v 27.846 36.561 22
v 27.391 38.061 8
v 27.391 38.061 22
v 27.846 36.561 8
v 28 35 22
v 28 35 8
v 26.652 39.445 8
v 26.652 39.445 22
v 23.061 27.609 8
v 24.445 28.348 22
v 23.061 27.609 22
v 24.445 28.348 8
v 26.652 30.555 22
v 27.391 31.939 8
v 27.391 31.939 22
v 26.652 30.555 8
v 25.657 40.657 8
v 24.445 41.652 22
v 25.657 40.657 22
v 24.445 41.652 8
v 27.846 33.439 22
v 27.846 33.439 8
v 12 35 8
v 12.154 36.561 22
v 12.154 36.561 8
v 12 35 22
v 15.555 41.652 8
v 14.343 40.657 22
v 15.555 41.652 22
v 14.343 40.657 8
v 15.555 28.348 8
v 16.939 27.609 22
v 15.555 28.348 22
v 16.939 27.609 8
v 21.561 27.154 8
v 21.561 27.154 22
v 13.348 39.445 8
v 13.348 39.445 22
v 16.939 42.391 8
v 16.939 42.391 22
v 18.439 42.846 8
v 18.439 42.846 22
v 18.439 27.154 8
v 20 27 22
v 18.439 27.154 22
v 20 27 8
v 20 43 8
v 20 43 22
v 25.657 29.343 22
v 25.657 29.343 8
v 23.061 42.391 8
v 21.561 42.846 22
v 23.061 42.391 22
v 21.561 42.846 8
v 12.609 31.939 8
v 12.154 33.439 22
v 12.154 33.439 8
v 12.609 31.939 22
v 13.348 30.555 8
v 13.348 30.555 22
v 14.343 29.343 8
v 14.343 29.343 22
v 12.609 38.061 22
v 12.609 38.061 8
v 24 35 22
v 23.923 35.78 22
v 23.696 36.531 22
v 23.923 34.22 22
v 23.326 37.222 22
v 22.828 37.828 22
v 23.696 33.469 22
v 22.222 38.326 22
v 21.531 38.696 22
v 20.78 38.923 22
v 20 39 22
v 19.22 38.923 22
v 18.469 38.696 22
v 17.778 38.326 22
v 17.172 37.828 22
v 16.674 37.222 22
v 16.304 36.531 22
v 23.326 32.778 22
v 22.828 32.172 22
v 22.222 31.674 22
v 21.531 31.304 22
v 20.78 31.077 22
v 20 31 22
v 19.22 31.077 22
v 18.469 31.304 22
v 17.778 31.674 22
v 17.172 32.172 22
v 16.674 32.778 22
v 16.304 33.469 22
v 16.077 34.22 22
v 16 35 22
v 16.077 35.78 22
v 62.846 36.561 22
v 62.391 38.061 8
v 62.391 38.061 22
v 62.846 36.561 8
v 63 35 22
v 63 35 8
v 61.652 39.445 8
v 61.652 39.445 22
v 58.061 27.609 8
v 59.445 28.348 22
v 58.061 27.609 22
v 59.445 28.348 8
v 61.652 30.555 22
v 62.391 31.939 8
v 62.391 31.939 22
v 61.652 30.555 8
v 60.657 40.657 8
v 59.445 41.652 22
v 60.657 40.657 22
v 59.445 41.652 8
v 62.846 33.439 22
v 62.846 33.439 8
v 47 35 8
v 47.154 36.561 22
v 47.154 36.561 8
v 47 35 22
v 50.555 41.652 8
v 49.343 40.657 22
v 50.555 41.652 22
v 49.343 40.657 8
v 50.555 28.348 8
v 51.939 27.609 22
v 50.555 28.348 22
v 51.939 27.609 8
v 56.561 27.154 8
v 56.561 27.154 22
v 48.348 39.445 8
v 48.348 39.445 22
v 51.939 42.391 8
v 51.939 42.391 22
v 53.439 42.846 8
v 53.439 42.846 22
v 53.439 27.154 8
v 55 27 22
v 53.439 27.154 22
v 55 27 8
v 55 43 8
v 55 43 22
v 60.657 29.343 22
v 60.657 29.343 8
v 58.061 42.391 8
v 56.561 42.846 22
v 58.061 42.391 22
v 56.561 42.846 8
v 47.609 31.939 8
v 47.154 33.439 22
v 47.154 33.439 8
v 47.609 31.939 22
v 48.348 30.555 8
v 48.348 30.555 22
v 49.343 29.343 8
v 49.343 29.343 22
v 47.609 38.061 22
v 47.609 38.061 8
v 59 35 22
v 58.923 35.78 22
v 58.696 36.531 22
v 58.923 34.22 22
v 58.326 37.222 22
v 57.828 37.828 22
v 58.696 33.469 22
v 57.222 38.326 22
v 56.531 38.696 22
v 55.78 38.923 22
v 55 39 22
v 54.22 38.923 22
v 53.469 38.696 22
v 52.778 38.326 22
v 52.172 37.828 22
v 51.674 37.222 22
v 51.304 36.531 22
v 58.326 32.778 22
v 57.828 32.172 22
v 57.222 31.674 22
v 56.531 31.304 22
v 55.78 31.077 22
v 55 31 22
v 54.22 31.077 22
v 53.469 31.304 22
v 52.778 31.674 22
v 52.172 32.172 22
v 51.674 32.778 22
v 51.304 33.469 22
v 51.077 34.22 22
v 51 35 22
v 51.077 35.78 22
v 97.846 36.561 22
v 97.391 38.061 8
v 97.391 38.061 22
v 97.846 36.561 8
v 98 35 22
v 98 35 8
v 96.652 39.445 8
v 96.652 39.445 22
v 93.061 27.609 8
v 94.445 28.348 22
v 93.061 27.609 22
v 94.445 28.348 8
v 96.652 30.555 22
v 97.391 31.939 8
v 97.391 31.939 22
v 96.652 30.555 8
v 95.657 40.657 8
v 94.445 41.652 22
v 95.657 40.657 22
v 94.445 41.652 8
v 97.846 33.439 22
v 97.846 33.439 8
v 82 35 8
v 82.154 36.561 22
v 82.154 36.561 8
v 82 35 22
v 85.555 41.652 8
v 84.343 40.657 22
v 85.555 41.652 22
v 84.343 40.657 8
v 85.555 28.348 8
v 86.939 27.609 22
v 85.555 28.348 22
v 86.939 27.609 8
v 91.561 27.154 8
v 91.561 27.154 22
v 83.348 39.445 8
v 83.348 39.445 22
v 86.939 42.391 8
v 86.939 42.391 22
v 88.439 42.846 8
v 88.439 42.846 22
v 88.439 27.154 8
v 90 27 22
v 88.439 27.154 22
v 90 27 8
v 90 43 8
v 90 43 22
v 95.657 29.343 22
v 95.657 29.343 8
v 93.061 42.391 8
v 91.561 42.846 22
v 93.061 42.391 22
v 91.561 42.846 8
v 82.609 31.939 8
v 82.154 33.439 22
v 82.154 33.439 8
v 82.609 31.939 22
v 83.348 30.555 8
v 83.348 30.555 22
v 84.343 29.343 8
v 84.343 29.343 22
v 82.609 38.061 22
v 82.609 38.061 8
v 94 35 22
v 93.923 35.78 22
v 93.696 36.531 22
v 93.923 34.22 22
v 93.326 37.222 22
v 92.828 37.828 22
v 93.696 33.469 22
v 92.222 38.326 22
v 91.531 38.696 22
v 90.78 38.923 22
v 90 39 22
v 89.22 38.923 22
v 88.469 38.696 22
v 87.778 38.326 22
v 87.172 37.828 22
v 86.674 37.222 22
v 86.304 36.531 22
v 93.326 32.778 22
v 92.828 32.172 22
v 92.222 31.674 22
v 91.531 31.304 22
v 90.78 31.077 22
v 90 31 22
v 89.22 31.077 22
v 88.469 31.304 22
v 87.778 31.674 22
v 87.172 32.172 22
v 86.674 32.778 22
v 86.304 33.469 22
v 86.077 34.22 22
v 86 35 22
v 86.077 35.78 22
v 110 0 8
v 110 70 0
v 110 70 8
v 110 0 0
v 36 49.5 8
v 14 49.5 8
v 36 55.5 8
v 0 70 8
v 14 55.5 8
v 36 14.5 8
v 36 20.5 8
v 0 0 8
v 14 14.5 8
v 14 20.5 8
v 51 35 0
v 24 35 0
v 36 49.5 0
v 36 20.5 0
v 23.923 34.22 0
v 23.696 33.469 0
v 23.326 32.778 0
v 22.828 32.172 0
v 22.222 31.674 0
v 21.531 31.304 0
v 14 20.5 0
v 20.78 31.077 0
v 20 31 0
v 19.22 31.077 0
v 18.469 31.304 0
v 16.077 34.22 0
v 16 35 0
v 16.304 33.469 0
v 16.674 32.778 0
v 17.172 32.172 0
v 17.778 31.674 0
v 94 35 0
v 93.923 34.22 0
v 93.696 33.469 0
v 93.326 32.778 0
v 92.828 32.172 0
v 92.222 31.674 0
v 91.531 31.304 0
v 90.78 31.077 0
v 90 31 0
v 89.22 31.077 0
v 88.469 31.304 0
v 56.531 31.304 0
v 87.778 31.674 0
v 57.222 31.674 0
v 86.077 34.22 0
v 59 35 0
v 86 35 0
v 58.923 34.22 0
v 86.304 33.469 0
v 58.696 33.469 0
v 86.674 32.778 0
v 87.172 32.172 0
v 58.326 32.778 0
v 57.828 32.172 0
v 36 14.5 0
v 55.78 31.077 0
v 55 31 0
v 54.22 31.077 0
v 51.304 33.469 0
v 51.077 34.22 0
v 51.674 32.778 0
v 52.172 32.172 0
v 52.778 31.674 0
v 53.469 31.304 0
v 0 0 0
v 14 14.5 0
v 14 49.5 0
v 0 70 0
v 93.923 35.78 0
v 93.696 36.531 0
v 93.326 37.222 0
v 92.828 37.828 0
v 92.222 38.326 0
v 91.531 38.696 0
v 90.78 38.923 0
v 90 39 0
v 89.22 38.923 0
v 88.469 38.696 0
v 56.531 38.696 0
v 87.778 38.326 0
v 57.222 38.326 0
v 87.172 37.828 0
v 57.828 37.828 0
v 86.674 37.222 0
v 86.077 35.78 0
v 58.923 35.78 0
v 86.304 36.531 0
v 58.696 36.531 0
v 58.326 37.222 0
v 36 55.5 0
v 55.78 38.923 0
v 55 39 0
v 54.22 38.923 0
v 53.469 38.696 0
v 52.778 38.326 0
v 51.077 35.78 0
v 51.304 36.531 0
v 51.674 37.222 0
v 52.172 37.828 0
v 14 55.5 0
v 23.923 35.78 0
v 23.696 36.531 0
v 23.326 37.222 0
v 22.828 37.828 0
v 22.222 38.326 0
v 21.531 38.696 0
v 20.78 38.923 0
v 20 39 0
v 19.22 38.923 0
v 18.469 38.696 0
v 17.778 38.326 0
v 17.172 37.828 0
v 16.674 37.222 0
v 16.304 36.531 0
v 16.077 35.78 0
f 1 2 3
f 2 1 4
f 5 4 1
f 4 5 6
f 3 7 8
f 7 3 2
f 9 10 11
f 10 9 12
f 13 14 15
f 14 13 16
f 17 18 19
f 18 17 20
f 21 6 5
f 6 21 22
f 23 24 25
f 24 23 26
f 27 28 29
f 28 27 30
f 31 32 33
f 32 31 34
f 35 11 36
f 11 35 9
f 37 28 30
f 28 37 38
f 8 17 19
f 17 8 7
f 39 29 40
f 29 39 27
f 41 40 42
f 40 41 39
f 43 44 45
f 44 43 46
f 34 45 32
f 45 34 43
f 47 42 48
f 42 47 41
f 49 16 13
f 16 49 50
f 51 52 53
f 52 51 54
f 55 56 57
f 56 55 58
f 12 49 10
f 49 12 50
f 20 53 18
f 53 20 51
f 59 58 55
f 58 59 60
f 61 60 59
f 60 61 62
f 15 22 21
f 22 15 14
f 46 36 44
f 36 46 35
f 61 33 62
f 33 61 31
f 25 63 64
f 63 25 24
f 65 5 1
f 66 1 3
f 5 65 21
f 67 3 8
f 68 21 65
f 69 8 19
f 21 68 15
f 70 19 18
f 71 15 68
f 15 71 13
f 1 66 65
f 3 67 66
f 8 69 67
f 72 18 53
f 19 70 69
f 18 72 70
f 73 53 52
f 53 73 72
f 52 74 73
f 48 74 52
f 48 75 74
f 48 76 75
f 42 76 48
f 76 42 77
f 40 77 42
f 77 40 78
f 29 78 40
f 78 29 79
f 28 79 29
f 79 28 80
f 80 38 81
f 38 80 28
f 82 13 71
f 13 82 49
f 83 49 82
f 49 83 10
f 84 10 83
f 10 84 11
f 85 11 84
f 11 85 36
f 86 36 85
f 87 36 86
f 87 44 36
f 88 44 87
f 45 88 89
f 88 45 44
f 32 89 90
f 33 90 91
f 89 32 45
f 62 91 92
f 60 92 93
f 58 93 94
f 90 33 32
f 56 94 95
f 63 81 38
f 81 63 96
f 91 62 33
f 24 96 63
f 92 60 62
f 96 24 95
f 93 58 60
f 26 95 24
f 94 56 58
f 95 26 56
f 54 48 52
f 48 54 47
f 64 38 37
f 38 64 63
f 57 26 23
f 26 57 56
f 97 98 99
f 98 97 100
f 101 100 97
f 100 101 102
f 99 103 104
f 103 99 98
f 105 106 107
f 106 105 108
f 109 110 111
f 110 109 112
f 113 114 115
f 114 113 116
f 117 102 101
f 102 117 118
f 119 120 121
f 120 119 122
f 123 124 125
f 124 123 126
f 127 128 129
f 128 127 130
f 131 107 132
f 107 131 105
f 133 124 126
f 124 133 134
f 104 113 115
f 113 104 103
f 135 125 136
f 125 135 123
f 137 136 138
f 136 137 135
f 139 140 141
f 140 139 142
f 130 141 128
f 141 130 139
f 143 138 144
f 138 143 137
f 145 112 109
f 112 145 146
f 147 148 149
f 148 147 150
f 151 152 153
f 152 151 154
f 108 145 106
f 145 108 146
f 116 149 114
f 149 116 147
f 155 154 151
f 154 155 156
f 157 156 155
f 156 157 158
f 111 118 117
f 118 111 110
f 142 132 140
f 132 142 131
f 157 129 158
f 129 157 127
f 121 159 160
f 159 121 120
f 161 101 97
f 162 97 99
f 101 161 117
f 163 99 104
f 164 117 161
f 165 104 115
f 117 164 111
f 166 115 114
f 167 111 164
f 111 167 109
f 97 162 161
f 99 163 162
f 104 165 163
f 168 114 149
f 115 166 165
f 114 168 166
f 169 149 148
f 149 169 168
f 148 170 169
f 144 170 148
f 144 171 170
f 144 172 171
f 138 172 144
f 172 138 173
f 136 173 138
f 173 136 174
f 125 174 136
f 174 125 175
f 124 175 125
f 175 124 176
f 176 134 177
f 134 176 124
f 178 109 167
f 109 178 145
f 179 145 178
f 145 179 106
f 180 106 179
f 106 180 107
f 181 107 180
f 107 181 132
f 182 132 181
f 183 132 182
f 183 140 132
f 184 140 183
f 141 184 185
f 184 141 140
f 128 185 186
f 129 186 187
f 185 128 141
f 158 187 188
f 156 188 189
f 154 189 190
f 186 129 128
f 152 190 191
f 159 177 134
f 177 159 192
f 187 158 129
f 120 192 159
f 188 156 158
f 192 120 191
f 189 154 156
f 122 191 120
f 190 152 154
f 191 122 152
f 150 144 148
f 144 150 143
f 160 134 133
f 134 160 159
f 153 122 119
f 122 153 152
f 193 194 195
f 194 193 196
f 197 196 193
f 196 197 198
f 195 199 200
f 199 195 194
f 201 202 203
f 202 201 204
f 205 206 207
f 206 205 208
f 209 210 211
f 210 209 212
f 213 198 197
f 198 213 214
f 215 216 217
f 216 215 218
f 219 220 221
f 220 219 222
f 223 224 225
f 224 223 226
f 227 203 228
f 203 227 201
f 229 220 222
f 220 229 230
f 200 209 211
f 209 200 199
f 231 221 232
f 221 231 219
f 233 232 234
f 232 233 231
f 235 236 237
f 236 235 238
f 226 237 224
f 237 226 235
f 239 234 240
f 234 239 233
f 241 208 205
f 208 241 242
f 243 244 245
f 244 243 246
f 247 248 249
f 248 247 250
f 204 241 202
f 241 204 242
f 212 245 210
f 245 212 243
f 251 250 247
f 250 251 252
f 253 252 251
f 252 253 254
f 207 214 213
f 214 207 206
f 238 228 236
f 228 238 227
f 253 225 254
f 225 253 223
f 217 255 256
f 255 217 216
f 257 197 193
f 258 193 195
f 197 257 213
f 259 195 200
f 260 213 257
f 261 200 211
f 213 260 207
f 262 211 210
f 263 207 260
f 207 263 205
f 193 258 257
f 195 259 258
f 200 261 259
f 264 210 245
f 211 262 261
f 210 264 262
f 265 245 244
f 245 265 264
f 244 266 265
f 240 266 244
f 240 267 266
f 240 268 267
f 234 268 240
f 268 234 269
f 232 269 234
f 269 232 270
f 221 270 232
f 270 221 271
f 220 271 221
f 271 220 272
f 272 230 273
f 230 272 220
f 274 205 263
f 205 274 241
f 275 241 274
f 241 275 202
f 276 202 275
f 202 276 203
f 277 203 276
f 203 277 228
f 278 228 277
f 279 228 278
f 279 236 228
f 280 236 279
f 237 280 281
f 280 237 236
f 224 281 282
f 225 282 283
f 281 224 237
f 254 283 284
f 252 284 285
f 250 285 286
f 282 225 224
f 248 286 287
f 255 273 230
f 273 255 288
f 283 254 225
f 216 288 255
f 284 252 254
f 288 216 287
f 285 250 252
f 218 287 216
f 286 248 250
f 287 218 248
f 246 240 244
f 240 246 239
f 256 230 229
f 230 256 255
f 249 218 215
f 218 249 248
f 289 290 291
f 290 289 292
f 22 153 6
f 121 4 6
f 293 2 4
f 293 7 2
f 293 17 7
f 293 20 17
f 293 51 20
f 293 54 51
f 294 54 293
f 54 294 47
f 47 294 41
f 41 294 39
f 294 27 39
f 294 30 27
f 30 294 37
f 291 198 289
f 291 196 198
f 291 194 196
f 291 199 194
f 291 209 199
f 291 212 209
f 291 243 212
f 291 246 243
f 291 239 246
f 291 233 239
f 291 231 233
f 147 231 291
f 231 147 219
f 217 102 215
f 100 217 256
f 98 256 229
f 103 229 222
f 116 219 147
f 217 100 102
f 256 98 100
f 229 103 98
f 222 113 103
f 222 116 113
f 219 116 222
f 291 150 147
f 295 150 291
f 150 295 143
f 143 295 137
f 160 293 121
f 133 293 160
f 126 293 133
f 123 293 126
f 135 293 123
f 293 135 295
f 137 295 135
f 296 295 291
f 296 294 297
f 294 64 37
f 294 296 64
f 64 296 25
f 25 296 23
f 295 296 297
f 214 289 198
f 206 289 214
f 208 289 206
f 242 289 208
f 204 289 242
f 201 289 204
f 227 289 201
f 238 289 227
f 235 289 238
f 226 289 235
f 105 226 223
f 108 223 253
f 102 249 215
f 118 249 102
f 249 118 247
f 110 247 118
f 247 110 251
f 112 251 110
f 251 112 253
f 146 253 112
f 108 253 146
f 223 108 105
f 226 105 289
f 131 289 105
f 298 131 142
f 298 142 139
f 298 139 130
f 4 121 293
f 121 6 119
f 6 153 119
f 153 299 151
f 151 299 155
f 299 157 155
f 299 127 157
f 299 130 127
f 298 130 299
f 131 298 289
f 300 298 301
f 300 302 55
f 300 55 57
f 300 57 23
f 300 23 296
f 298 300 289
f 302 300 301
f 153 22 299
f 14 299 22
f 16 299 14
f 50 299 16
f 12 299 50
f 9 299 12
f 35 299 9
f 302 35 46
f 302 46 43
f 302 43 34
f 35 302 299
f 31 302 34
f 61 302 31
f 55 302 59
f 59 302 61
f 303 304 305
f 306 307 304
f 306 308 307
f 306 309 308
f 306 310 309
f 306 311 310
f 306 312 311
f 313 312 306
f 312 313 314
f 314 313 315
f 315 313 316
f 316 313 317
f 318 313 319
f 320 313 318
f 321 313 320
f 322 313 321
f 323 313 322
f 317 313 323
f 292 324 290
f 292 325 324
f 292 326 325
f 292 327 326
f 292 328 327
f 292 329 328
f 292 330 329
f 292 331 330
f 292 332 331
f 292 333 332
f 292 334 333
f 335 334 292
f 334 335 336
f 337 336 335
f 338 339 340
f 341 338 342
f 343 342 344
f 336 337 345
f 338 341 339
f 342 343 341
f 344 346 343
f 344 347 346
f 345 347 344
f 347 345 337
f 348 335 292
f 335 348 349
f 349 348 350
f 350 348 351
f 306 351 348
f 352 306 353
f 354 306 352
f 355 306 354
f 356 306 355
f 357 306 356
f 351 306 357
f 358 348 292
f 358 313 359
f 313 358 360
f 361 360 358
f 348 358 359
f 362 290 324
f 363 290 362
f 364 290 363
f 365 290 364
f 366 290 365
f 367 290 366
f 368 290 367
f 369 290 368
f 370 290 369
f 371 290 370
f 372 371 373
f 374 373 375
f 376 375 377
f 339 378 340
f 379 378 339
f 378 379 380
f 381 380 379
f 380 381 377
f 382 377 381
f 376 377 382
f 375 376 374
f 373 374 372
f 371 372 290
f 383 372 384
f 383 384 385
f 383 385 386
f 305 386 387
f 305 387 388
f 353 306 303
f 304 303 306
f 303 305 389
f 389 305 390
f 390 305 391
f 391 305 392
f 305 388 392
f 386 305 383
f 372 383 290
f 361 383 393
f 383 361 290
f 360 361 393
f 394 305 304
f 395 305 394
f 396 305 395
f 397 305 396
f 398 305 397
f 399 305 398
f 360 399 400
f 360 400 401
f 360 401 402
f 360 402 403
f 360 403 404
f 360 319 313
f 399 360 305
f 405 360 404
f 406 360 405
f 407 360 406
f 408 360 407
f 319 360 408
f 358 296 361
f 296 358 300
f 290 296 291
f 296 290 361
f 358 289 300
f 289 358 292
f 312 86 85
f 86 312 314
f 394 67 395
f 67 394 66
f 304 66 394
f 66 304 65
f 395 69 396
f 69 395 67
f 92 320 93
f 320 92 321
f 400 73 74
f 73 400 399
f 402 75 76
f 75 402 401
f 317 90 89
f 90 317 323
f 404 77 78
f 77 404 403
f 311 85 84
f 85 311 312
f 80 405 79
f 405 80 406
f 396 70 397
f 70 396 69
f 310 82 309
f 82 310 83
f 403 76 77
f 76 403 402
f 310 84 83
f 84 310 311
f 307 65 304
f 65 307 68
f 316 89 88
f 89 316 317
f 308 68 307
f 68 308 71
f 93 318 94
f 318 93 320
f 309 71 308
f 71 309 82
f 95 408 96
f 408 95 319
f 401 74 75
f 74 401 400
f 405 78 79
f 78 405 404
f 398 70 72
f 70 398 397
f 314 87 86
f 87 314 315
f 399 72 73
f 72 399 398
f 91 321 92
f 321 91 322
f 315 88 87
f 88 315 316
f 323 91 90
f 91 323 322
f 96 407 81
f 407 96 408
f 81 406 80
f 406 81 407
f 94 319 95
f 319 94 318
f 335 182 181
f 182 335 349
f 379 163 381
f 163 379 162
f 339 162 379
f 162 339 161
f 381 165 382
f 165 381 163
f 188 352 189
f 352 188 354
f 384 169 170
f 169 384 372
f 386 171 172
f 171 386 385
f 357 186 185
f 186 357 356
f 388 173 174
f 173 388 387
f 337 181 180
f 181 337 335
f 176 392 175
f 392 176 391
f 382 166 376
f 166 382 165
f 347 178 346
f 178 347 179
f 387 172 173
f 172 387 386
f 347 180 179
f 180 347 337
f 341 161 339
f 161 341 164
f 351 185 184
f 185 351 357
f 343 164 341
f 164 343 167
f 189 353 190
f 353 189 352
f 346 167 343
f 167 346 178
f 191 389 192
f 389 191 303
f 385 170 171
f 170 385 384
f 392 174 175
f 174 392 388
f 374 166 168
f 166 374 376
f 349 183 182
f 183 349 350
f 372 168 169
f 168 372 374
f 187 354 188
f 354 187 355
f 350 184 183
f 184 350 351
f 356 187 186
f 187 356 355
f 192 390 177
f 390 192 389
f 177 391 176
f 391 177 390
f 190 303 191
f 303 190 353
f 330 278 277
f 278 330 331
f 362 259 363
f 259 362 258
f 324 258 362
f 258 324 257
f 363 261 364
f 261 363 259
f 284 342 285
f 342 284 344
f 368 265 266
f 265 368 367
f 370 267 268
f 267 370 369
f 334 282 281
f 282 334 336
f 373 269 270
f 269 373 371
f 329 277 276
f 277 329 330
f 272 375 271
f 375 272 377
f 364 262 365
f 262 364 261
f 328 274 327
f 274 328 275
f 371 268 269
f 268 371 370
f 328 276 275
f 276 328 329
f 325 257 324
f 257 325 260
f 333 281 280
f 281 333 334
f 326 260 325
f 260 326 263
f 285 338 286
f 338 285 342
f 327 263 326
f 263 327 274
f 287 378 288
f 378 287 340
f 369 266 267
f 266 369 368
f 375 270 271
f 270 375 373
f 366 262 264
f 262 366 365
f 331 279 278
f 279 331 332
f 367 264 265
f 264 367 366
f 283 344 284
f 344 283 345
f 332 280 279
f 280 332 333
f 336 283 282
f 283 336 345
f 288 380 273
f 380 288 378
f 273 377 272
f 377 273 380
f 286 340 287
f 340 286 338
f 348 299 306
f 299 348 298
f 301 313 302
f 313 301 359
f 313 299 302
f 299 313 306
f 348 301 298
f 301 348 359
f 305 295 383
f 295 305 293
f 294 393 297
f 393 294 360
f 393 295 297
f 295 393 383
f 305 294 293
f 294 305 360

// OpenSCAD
$fn = 32;

// ----------------------------------------------------------------------
// Drill jig: three_boss_slot jig
// ----------------------------------------------------------------------

// --- parameters (mm) ---
plate_l = 110;            // plate length, X
plate_w = 70;             // plate width, Y
plate_t = 8;              // plate thickness
boss_d = 16;              // guide boss diameter
boss_h = 15;              // boss height above the plate
guide_d = 8;              // guide hole diameter
boss_pitch = 35;          // boss pitch
slot_w = 6;               // clamp slot width
slot_l = 22;              // clamp slot length
slot_x = 14;              // slot start X
fit_tol = 0.1;            // tolerance for press fits, mm
free_tol = 0.3;           // tolerance for clearance fits, mm

n_boss = 3;  // guide bosses
boss_x0 = (plate_l - (n_boss - 1) * boss_pitch) / 2;  // first boss X
boss_top = plate_t - 1 + boss_h;  // boss crown height
total_h = boss_top;  // overall height

difference() {
  union() {
  cube([plate_l, plate_w, plate_t]);
  for (i = [0 : n_boss - 1])
    translate([boss_x0 + i * boss_pitch, plate_w / 2, plate_t - 1])
      cylinder(h = boss_h, d = boss_d);
  }
  for (i = [0 : n_boss - 1])
    translate([boss_x0 + i * boss_pitch, plate_w / 2, -1])
      cylinder(h = plate_t + boss_h, d = guide_d);
  for (cy = [plate_w * 0.25, plate_w * 0.75])
    translate([slot_x, cy - slot_w / 2, -1])
      cube([slot_l, slot_w, plate_t + 2]);
}
